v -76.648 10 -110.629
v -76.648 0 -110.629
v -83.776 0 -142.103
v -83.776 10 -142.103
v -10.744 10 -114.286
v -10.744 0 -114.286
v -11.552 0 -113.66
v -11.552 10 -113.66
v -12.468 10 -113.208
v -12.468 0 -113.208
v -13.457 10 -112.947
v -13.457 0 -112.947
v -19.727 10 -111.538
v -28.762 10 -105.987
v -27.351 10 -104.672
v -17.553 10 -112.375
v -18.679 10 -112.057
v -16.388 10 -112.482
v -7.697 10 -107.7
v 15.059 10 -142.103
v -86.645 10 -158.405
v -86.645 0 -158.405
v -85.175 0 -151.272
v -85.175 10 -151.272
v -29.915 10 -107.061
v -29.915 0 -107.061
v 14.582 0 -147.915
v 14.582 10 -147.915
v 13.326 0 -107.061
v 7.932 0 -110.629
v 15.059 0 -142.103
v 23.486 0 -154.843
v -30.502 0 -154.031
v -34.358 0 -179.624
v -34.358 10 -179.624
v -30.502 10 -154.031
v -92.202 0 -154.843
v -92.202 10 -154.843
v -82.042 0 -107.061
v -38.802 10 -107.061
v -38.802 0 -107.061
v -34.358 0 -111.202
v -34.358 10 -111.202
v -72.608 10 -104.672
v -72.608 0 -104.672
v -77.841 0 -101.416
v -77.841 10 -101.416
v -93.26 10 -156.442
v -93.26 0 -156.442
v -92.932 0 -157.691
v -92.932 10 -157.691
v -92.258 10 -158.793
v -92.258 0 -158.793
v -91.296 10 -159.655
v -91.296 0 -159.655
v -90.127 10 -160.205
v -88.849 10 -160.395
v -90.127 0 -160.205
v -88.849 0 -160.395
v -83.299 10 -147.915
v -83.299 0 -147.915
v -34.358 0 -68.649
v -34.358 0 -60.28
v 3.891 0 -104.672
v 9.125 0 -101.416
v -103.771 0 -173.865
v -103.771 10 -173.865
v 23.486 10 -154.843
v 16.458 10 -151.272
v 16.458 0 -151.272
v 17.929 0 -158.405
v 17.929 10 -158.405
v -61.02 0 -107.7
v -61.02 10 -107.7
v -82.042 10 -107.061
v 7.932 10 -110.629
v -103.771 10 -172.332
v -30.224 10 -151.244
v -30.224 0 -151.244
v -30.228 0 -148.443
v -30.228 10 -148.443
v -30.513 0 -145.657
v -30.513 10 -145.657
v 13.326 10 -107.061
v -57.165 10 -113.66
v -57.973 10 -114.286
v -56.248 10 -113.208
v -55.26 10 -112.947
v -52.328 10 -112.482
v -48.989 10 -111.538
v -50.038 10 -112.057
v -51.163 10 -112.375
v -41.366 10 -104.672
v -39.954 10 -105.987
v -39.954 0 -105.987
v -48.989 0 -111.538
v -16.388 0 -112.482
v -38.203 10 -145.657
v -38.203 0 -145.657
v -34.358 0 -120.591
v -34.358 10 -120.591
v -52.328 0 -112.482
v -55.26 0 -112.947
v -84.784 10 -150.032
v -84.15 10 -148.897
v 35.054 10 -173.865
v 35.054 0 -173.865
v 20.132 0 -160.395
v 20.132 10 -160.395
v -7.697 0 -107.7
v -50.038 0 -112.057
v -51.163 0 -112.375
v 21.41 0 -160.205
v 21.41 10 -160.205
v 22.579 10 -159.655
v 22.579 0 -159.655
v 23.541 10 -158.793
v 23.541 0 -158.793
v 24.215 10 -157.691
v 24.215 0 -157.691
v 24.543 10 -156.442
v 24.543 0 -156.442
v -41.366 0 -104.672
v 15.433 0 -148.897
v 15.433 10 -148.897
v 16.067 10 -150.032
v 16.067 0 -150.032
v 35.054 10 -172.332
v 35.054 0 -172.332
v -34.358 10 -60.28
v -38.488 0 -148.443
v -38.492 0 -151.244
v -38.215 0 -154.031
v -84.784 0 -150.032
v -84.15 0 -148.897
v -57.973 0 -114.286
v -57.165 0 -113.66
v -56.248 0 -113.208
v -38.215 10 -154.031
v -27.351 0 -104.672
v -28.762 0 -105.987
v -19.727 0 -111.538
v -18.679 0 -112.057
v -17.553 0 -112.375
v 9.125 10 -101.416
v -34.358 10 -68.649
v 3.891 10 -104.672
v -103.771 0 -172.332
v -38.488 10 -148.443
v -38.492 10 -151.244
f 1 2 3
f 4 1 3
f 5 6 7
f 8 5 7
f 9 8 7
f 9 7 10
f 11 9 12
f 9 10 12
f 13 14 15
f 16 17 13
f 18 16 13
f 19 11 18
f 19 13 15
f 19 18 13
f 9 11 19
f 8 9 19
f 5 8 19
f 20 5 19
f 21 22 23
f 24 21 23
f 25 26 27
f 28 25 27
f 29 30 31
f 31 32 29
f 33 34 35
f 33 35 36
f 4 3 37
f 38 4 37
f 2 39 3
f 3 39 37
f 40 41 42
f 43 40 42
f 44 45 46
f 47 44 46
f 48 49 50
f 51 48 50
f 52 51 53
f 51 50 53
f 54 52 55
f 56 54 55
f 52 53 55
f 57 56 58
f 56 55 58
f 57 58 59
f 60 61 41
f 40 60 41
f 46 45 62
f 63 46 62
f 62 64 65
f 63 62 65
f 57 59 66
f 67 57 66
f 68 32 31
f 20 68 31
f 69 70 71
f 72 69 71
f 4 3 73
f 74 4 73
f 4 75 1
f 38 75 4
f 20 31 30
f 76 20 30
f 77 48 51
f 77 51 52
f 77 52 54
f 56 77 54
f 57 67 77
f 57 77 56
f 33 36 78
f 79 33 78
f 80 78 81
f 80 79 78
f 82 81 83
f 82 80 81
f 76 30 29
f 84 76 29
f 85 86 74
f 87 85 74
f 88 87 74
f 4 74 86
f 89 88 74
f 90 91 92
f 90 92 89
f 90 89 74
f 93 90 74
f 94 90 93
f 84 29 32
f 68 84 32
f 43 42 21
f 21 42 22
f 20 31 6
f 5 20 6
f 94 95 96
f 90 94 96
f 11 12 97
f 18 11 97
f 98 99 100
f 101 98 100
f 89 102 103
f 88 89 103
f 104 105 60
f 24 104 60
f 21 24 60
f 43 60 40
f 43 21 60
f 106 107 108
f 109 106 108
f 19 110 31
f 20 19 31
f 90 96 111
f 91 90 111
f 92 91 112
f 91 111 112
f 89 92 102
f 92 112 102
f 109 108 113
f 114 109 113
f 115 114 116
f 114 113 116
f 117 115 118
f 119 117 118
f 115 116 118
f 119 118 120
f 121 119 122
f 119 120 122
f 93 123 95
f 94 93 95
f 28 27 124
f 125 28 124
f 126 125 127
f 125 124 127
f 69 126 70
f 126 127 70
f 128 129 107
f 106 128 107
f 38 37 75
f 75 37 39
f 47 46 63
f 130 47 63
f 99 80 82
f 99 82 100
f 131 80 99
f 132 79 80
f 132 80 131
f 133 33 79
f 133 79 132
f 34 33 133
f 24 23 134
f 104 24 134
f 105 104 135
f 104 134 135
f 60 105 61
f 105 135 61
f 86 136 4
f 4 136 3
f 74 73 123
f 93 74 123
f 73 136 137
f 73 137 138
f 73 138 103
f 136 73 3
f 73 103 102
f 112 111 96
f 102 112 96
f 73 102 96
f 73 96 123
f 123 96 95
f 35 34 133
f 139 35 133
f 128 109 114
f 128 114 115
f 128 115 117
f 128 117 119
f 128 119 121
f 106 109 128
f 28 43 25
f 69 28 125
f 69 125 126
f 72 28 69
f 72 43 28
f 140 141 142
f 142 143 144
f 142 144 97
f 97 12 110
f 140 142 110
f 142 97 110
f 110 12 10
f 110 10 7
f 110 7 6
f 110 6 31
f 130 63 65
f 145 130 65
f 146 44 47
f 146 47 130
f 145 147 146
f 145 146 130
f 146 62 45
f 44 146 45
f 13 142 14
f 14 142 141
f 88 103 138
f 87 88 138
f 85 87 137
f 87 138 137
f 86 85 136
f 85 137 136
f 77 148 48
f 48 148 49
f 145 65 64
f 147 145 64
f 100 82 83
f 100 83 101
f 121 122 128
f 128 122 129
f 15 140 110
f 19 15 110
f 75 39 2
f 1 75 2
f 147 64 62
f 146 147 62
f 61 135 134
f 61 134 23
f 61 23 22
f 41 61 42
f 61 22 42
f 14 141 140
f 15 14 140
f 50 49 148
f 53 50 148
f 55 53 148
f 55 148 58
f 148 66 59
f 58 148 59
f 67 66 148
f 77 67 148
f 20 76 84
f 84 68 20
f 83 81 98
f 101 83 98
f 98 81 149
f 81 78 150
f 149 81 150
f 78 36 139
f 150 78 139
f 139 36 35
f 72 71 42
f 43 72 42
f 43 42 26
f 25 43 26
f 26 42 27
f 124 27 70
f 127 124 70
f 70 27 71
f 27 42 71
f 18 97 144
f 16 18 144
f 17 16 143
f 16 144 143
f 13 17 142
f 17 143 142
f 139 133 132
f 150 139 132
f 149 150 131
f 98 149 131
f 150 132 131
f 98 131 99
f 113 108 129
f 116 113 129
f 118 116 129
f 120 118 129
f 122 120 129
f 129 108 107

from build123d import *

# Parameters (mm, degrees)
BOSS_EXTRUDE1_DEPTH = 10


with BuildPart() as part:
    # Sketch1 → Boss-Extrude1 (new body)
    with BuildSketch(Plane(origin=(0, 0, 0), x_dir=(1, 0, 0), z_dir=(0, 1, 0))):
        with BuildLine():
            Line((-38.80180608, 107.061199976), (-34.358321309, 111.202312229))
            Line((-34.358321309, 111.202312229), (-86.645351215, 158.405295793))
            Line((-86.645351215, 158.405295793), (-85.174816603, 151.271524399))
            ThreePointArc((-85.174816603, 151.271524399), (-84.49600208, 149.448444582), (-83.299059708, 147.914906799))
            Line((-83.299059708, 147.914906799), (-38.80180608, 107.061199976))
        make_face()
        with BuildLine():
            ThreePointArc((-93.259871061, 156.441713091), (-91.80845524, 159.259552882), (-88.849013307, 160.3946883))
            Line((-88.849013307, 160.3946883), (-103.770558364, 173.865360612))
            Line((-103.770558364, 173.865360612), (-103.770558364, 172.332135816))
            Line((-103.770558364, 172.332135816), (-93.259871061, 156.441713091))
        make_face()
        with BuildLine():
            Line((-41.36570241, 104.671772971), (-39.954323301, 105.987109835))
            Line((-39.954323301, 105.987109835), (-48.989329139, 111.538283499))
            ThreePointArc((-48.989329139, 111.538283499), (-50.593338483, 112.241564878), (-52.328165313, 112.482036388))
            Line((-52.328165313, 112.482036388), (-55.25998468, 112.947419576))
            ThreePointArc((-55.25998468, 112.947419576), (-56.71778726, 113.411069709), (-57.972571628, 114.286098849))
            Line((-57.972571628, 114.286098849), (-83.775548308, 142.102984))
            Line((-83.775548308, 142.102984), (-61.019880213, 107.700173319))
            Line((-61.019880213, 107.700173319), (-41.36570241, 104.671772971))
        make_face()
        Polygon((-83.775548308, 142.102984), (-92.202313911, 154.8428614), (-82.042161158, 107.061199976), (-76.648185291, 110.629034176), align=None)
        Polygon((-34.358321309, 60.280395364), (-34.358321309, 68.649296695), (-72.607617289, 104.671772971), (-77.841407623, 101.415785755), align=None)
        Polygon((3.89097467, 104.671772971), (-34.358321309, 68.649296695), (-34.358321309, 60.280395364), (9.124765004, 101.415785755), align=None)
        Polygon((13.325518539, 107.061199976), (23.485671292, 154.8428614), (15.058905689, 142.102984), (7.931542673, 110.629034176), align=None)
        with BuildLine():
            Line((35.053915745, 173.865360612), (20.132370689, 160.3946883))
            ThreePointArc((20.132370689, 160.3946883), (23.091812622, 159.259552882), (24.543228442, 156.441713091))
            Line((24.543228442, 156.441713091), (35.053915745, 172.332135816))
            Line((35.053915745, 172.332135816), (35.053915745, 173.865360612))
        make_face()
        with BuildLine():
            Line((17.928708597, 158.405295793), (-34.358321309, 111.202312229))
            Line((-34.358321309, 111.202312229), (-29.914836539, 107.061199976))
            Line((-29.914836539, 107.061199976), (14.58241709, 147.914906799))
            ThreePointArc((14.58241709, 147.914906799), (15.779359461, 149.448444582), (16.458173984, 151.271524399))
            Line((16.458173984, 151.271524399), (17.928708597, 158.405295793))
        make_face()
        with BuildLine():
            Line((-19.72731348, 111.538283499), (-28.762319318, 105.987109835))
            Line((-28.762319318, 105.987109835), (-27.350940209, 104.671772971))
            Line((-27.350940209, 104.671772971), (-7.696762406, 107.700173319))
            Line((-7.696762406, 107.700173319), (15.058905689, 142.102984))
            Line((15.058905689, 142.102984), (-10.744070991, 114.286098849))
            ThreePointArc((-10.744070991, 114.286098849), (-11.998855359, 113.411069709), (-13.456657938, 112.947419576))
            Line((-13.456657938, 112.947419576), (-16.388477306, 112.482036388))
            ThreePointArc((-16.388477306, 112.482036388), (-18.123304135, 112.241564878), (-19.72731348, 111.538283499))
        make_face()
        with BuildLine():
            ThreePointArc((-30.502017254, 154.03074681), (-30.191123443, 149.843448403), (-30.513157693, 145.656992043))
            Line((-30.513157693, 145.656992043), (-34.358321309, 120.590655623))
            Line((-34.358321309, 120.590655623), (-34.358321309, 179.623895831))
            Line((-34.358321309, 179.623895831), (-30.502017254, 154.03074681))
        make_face()
        with BuildLine():
            Line((-34.358321309, 179.623895831), (-38.214625364, 154.03074681))
            ThreePointArc((-38.214625364, 154.03074681), (-38.525519176, 149.843448403), (-38.203484926, 145.656992043))
            Line((-38.203484926, 145.656992043), (-34.358321309, 120.590655623))
            Line((-34.358321309, 120.590655623), (-34.358321309, 179.623895831))
        make_face()
    extrude(amount=BOSS_EXTRUDE1_DEPTH)


solid = part.part
